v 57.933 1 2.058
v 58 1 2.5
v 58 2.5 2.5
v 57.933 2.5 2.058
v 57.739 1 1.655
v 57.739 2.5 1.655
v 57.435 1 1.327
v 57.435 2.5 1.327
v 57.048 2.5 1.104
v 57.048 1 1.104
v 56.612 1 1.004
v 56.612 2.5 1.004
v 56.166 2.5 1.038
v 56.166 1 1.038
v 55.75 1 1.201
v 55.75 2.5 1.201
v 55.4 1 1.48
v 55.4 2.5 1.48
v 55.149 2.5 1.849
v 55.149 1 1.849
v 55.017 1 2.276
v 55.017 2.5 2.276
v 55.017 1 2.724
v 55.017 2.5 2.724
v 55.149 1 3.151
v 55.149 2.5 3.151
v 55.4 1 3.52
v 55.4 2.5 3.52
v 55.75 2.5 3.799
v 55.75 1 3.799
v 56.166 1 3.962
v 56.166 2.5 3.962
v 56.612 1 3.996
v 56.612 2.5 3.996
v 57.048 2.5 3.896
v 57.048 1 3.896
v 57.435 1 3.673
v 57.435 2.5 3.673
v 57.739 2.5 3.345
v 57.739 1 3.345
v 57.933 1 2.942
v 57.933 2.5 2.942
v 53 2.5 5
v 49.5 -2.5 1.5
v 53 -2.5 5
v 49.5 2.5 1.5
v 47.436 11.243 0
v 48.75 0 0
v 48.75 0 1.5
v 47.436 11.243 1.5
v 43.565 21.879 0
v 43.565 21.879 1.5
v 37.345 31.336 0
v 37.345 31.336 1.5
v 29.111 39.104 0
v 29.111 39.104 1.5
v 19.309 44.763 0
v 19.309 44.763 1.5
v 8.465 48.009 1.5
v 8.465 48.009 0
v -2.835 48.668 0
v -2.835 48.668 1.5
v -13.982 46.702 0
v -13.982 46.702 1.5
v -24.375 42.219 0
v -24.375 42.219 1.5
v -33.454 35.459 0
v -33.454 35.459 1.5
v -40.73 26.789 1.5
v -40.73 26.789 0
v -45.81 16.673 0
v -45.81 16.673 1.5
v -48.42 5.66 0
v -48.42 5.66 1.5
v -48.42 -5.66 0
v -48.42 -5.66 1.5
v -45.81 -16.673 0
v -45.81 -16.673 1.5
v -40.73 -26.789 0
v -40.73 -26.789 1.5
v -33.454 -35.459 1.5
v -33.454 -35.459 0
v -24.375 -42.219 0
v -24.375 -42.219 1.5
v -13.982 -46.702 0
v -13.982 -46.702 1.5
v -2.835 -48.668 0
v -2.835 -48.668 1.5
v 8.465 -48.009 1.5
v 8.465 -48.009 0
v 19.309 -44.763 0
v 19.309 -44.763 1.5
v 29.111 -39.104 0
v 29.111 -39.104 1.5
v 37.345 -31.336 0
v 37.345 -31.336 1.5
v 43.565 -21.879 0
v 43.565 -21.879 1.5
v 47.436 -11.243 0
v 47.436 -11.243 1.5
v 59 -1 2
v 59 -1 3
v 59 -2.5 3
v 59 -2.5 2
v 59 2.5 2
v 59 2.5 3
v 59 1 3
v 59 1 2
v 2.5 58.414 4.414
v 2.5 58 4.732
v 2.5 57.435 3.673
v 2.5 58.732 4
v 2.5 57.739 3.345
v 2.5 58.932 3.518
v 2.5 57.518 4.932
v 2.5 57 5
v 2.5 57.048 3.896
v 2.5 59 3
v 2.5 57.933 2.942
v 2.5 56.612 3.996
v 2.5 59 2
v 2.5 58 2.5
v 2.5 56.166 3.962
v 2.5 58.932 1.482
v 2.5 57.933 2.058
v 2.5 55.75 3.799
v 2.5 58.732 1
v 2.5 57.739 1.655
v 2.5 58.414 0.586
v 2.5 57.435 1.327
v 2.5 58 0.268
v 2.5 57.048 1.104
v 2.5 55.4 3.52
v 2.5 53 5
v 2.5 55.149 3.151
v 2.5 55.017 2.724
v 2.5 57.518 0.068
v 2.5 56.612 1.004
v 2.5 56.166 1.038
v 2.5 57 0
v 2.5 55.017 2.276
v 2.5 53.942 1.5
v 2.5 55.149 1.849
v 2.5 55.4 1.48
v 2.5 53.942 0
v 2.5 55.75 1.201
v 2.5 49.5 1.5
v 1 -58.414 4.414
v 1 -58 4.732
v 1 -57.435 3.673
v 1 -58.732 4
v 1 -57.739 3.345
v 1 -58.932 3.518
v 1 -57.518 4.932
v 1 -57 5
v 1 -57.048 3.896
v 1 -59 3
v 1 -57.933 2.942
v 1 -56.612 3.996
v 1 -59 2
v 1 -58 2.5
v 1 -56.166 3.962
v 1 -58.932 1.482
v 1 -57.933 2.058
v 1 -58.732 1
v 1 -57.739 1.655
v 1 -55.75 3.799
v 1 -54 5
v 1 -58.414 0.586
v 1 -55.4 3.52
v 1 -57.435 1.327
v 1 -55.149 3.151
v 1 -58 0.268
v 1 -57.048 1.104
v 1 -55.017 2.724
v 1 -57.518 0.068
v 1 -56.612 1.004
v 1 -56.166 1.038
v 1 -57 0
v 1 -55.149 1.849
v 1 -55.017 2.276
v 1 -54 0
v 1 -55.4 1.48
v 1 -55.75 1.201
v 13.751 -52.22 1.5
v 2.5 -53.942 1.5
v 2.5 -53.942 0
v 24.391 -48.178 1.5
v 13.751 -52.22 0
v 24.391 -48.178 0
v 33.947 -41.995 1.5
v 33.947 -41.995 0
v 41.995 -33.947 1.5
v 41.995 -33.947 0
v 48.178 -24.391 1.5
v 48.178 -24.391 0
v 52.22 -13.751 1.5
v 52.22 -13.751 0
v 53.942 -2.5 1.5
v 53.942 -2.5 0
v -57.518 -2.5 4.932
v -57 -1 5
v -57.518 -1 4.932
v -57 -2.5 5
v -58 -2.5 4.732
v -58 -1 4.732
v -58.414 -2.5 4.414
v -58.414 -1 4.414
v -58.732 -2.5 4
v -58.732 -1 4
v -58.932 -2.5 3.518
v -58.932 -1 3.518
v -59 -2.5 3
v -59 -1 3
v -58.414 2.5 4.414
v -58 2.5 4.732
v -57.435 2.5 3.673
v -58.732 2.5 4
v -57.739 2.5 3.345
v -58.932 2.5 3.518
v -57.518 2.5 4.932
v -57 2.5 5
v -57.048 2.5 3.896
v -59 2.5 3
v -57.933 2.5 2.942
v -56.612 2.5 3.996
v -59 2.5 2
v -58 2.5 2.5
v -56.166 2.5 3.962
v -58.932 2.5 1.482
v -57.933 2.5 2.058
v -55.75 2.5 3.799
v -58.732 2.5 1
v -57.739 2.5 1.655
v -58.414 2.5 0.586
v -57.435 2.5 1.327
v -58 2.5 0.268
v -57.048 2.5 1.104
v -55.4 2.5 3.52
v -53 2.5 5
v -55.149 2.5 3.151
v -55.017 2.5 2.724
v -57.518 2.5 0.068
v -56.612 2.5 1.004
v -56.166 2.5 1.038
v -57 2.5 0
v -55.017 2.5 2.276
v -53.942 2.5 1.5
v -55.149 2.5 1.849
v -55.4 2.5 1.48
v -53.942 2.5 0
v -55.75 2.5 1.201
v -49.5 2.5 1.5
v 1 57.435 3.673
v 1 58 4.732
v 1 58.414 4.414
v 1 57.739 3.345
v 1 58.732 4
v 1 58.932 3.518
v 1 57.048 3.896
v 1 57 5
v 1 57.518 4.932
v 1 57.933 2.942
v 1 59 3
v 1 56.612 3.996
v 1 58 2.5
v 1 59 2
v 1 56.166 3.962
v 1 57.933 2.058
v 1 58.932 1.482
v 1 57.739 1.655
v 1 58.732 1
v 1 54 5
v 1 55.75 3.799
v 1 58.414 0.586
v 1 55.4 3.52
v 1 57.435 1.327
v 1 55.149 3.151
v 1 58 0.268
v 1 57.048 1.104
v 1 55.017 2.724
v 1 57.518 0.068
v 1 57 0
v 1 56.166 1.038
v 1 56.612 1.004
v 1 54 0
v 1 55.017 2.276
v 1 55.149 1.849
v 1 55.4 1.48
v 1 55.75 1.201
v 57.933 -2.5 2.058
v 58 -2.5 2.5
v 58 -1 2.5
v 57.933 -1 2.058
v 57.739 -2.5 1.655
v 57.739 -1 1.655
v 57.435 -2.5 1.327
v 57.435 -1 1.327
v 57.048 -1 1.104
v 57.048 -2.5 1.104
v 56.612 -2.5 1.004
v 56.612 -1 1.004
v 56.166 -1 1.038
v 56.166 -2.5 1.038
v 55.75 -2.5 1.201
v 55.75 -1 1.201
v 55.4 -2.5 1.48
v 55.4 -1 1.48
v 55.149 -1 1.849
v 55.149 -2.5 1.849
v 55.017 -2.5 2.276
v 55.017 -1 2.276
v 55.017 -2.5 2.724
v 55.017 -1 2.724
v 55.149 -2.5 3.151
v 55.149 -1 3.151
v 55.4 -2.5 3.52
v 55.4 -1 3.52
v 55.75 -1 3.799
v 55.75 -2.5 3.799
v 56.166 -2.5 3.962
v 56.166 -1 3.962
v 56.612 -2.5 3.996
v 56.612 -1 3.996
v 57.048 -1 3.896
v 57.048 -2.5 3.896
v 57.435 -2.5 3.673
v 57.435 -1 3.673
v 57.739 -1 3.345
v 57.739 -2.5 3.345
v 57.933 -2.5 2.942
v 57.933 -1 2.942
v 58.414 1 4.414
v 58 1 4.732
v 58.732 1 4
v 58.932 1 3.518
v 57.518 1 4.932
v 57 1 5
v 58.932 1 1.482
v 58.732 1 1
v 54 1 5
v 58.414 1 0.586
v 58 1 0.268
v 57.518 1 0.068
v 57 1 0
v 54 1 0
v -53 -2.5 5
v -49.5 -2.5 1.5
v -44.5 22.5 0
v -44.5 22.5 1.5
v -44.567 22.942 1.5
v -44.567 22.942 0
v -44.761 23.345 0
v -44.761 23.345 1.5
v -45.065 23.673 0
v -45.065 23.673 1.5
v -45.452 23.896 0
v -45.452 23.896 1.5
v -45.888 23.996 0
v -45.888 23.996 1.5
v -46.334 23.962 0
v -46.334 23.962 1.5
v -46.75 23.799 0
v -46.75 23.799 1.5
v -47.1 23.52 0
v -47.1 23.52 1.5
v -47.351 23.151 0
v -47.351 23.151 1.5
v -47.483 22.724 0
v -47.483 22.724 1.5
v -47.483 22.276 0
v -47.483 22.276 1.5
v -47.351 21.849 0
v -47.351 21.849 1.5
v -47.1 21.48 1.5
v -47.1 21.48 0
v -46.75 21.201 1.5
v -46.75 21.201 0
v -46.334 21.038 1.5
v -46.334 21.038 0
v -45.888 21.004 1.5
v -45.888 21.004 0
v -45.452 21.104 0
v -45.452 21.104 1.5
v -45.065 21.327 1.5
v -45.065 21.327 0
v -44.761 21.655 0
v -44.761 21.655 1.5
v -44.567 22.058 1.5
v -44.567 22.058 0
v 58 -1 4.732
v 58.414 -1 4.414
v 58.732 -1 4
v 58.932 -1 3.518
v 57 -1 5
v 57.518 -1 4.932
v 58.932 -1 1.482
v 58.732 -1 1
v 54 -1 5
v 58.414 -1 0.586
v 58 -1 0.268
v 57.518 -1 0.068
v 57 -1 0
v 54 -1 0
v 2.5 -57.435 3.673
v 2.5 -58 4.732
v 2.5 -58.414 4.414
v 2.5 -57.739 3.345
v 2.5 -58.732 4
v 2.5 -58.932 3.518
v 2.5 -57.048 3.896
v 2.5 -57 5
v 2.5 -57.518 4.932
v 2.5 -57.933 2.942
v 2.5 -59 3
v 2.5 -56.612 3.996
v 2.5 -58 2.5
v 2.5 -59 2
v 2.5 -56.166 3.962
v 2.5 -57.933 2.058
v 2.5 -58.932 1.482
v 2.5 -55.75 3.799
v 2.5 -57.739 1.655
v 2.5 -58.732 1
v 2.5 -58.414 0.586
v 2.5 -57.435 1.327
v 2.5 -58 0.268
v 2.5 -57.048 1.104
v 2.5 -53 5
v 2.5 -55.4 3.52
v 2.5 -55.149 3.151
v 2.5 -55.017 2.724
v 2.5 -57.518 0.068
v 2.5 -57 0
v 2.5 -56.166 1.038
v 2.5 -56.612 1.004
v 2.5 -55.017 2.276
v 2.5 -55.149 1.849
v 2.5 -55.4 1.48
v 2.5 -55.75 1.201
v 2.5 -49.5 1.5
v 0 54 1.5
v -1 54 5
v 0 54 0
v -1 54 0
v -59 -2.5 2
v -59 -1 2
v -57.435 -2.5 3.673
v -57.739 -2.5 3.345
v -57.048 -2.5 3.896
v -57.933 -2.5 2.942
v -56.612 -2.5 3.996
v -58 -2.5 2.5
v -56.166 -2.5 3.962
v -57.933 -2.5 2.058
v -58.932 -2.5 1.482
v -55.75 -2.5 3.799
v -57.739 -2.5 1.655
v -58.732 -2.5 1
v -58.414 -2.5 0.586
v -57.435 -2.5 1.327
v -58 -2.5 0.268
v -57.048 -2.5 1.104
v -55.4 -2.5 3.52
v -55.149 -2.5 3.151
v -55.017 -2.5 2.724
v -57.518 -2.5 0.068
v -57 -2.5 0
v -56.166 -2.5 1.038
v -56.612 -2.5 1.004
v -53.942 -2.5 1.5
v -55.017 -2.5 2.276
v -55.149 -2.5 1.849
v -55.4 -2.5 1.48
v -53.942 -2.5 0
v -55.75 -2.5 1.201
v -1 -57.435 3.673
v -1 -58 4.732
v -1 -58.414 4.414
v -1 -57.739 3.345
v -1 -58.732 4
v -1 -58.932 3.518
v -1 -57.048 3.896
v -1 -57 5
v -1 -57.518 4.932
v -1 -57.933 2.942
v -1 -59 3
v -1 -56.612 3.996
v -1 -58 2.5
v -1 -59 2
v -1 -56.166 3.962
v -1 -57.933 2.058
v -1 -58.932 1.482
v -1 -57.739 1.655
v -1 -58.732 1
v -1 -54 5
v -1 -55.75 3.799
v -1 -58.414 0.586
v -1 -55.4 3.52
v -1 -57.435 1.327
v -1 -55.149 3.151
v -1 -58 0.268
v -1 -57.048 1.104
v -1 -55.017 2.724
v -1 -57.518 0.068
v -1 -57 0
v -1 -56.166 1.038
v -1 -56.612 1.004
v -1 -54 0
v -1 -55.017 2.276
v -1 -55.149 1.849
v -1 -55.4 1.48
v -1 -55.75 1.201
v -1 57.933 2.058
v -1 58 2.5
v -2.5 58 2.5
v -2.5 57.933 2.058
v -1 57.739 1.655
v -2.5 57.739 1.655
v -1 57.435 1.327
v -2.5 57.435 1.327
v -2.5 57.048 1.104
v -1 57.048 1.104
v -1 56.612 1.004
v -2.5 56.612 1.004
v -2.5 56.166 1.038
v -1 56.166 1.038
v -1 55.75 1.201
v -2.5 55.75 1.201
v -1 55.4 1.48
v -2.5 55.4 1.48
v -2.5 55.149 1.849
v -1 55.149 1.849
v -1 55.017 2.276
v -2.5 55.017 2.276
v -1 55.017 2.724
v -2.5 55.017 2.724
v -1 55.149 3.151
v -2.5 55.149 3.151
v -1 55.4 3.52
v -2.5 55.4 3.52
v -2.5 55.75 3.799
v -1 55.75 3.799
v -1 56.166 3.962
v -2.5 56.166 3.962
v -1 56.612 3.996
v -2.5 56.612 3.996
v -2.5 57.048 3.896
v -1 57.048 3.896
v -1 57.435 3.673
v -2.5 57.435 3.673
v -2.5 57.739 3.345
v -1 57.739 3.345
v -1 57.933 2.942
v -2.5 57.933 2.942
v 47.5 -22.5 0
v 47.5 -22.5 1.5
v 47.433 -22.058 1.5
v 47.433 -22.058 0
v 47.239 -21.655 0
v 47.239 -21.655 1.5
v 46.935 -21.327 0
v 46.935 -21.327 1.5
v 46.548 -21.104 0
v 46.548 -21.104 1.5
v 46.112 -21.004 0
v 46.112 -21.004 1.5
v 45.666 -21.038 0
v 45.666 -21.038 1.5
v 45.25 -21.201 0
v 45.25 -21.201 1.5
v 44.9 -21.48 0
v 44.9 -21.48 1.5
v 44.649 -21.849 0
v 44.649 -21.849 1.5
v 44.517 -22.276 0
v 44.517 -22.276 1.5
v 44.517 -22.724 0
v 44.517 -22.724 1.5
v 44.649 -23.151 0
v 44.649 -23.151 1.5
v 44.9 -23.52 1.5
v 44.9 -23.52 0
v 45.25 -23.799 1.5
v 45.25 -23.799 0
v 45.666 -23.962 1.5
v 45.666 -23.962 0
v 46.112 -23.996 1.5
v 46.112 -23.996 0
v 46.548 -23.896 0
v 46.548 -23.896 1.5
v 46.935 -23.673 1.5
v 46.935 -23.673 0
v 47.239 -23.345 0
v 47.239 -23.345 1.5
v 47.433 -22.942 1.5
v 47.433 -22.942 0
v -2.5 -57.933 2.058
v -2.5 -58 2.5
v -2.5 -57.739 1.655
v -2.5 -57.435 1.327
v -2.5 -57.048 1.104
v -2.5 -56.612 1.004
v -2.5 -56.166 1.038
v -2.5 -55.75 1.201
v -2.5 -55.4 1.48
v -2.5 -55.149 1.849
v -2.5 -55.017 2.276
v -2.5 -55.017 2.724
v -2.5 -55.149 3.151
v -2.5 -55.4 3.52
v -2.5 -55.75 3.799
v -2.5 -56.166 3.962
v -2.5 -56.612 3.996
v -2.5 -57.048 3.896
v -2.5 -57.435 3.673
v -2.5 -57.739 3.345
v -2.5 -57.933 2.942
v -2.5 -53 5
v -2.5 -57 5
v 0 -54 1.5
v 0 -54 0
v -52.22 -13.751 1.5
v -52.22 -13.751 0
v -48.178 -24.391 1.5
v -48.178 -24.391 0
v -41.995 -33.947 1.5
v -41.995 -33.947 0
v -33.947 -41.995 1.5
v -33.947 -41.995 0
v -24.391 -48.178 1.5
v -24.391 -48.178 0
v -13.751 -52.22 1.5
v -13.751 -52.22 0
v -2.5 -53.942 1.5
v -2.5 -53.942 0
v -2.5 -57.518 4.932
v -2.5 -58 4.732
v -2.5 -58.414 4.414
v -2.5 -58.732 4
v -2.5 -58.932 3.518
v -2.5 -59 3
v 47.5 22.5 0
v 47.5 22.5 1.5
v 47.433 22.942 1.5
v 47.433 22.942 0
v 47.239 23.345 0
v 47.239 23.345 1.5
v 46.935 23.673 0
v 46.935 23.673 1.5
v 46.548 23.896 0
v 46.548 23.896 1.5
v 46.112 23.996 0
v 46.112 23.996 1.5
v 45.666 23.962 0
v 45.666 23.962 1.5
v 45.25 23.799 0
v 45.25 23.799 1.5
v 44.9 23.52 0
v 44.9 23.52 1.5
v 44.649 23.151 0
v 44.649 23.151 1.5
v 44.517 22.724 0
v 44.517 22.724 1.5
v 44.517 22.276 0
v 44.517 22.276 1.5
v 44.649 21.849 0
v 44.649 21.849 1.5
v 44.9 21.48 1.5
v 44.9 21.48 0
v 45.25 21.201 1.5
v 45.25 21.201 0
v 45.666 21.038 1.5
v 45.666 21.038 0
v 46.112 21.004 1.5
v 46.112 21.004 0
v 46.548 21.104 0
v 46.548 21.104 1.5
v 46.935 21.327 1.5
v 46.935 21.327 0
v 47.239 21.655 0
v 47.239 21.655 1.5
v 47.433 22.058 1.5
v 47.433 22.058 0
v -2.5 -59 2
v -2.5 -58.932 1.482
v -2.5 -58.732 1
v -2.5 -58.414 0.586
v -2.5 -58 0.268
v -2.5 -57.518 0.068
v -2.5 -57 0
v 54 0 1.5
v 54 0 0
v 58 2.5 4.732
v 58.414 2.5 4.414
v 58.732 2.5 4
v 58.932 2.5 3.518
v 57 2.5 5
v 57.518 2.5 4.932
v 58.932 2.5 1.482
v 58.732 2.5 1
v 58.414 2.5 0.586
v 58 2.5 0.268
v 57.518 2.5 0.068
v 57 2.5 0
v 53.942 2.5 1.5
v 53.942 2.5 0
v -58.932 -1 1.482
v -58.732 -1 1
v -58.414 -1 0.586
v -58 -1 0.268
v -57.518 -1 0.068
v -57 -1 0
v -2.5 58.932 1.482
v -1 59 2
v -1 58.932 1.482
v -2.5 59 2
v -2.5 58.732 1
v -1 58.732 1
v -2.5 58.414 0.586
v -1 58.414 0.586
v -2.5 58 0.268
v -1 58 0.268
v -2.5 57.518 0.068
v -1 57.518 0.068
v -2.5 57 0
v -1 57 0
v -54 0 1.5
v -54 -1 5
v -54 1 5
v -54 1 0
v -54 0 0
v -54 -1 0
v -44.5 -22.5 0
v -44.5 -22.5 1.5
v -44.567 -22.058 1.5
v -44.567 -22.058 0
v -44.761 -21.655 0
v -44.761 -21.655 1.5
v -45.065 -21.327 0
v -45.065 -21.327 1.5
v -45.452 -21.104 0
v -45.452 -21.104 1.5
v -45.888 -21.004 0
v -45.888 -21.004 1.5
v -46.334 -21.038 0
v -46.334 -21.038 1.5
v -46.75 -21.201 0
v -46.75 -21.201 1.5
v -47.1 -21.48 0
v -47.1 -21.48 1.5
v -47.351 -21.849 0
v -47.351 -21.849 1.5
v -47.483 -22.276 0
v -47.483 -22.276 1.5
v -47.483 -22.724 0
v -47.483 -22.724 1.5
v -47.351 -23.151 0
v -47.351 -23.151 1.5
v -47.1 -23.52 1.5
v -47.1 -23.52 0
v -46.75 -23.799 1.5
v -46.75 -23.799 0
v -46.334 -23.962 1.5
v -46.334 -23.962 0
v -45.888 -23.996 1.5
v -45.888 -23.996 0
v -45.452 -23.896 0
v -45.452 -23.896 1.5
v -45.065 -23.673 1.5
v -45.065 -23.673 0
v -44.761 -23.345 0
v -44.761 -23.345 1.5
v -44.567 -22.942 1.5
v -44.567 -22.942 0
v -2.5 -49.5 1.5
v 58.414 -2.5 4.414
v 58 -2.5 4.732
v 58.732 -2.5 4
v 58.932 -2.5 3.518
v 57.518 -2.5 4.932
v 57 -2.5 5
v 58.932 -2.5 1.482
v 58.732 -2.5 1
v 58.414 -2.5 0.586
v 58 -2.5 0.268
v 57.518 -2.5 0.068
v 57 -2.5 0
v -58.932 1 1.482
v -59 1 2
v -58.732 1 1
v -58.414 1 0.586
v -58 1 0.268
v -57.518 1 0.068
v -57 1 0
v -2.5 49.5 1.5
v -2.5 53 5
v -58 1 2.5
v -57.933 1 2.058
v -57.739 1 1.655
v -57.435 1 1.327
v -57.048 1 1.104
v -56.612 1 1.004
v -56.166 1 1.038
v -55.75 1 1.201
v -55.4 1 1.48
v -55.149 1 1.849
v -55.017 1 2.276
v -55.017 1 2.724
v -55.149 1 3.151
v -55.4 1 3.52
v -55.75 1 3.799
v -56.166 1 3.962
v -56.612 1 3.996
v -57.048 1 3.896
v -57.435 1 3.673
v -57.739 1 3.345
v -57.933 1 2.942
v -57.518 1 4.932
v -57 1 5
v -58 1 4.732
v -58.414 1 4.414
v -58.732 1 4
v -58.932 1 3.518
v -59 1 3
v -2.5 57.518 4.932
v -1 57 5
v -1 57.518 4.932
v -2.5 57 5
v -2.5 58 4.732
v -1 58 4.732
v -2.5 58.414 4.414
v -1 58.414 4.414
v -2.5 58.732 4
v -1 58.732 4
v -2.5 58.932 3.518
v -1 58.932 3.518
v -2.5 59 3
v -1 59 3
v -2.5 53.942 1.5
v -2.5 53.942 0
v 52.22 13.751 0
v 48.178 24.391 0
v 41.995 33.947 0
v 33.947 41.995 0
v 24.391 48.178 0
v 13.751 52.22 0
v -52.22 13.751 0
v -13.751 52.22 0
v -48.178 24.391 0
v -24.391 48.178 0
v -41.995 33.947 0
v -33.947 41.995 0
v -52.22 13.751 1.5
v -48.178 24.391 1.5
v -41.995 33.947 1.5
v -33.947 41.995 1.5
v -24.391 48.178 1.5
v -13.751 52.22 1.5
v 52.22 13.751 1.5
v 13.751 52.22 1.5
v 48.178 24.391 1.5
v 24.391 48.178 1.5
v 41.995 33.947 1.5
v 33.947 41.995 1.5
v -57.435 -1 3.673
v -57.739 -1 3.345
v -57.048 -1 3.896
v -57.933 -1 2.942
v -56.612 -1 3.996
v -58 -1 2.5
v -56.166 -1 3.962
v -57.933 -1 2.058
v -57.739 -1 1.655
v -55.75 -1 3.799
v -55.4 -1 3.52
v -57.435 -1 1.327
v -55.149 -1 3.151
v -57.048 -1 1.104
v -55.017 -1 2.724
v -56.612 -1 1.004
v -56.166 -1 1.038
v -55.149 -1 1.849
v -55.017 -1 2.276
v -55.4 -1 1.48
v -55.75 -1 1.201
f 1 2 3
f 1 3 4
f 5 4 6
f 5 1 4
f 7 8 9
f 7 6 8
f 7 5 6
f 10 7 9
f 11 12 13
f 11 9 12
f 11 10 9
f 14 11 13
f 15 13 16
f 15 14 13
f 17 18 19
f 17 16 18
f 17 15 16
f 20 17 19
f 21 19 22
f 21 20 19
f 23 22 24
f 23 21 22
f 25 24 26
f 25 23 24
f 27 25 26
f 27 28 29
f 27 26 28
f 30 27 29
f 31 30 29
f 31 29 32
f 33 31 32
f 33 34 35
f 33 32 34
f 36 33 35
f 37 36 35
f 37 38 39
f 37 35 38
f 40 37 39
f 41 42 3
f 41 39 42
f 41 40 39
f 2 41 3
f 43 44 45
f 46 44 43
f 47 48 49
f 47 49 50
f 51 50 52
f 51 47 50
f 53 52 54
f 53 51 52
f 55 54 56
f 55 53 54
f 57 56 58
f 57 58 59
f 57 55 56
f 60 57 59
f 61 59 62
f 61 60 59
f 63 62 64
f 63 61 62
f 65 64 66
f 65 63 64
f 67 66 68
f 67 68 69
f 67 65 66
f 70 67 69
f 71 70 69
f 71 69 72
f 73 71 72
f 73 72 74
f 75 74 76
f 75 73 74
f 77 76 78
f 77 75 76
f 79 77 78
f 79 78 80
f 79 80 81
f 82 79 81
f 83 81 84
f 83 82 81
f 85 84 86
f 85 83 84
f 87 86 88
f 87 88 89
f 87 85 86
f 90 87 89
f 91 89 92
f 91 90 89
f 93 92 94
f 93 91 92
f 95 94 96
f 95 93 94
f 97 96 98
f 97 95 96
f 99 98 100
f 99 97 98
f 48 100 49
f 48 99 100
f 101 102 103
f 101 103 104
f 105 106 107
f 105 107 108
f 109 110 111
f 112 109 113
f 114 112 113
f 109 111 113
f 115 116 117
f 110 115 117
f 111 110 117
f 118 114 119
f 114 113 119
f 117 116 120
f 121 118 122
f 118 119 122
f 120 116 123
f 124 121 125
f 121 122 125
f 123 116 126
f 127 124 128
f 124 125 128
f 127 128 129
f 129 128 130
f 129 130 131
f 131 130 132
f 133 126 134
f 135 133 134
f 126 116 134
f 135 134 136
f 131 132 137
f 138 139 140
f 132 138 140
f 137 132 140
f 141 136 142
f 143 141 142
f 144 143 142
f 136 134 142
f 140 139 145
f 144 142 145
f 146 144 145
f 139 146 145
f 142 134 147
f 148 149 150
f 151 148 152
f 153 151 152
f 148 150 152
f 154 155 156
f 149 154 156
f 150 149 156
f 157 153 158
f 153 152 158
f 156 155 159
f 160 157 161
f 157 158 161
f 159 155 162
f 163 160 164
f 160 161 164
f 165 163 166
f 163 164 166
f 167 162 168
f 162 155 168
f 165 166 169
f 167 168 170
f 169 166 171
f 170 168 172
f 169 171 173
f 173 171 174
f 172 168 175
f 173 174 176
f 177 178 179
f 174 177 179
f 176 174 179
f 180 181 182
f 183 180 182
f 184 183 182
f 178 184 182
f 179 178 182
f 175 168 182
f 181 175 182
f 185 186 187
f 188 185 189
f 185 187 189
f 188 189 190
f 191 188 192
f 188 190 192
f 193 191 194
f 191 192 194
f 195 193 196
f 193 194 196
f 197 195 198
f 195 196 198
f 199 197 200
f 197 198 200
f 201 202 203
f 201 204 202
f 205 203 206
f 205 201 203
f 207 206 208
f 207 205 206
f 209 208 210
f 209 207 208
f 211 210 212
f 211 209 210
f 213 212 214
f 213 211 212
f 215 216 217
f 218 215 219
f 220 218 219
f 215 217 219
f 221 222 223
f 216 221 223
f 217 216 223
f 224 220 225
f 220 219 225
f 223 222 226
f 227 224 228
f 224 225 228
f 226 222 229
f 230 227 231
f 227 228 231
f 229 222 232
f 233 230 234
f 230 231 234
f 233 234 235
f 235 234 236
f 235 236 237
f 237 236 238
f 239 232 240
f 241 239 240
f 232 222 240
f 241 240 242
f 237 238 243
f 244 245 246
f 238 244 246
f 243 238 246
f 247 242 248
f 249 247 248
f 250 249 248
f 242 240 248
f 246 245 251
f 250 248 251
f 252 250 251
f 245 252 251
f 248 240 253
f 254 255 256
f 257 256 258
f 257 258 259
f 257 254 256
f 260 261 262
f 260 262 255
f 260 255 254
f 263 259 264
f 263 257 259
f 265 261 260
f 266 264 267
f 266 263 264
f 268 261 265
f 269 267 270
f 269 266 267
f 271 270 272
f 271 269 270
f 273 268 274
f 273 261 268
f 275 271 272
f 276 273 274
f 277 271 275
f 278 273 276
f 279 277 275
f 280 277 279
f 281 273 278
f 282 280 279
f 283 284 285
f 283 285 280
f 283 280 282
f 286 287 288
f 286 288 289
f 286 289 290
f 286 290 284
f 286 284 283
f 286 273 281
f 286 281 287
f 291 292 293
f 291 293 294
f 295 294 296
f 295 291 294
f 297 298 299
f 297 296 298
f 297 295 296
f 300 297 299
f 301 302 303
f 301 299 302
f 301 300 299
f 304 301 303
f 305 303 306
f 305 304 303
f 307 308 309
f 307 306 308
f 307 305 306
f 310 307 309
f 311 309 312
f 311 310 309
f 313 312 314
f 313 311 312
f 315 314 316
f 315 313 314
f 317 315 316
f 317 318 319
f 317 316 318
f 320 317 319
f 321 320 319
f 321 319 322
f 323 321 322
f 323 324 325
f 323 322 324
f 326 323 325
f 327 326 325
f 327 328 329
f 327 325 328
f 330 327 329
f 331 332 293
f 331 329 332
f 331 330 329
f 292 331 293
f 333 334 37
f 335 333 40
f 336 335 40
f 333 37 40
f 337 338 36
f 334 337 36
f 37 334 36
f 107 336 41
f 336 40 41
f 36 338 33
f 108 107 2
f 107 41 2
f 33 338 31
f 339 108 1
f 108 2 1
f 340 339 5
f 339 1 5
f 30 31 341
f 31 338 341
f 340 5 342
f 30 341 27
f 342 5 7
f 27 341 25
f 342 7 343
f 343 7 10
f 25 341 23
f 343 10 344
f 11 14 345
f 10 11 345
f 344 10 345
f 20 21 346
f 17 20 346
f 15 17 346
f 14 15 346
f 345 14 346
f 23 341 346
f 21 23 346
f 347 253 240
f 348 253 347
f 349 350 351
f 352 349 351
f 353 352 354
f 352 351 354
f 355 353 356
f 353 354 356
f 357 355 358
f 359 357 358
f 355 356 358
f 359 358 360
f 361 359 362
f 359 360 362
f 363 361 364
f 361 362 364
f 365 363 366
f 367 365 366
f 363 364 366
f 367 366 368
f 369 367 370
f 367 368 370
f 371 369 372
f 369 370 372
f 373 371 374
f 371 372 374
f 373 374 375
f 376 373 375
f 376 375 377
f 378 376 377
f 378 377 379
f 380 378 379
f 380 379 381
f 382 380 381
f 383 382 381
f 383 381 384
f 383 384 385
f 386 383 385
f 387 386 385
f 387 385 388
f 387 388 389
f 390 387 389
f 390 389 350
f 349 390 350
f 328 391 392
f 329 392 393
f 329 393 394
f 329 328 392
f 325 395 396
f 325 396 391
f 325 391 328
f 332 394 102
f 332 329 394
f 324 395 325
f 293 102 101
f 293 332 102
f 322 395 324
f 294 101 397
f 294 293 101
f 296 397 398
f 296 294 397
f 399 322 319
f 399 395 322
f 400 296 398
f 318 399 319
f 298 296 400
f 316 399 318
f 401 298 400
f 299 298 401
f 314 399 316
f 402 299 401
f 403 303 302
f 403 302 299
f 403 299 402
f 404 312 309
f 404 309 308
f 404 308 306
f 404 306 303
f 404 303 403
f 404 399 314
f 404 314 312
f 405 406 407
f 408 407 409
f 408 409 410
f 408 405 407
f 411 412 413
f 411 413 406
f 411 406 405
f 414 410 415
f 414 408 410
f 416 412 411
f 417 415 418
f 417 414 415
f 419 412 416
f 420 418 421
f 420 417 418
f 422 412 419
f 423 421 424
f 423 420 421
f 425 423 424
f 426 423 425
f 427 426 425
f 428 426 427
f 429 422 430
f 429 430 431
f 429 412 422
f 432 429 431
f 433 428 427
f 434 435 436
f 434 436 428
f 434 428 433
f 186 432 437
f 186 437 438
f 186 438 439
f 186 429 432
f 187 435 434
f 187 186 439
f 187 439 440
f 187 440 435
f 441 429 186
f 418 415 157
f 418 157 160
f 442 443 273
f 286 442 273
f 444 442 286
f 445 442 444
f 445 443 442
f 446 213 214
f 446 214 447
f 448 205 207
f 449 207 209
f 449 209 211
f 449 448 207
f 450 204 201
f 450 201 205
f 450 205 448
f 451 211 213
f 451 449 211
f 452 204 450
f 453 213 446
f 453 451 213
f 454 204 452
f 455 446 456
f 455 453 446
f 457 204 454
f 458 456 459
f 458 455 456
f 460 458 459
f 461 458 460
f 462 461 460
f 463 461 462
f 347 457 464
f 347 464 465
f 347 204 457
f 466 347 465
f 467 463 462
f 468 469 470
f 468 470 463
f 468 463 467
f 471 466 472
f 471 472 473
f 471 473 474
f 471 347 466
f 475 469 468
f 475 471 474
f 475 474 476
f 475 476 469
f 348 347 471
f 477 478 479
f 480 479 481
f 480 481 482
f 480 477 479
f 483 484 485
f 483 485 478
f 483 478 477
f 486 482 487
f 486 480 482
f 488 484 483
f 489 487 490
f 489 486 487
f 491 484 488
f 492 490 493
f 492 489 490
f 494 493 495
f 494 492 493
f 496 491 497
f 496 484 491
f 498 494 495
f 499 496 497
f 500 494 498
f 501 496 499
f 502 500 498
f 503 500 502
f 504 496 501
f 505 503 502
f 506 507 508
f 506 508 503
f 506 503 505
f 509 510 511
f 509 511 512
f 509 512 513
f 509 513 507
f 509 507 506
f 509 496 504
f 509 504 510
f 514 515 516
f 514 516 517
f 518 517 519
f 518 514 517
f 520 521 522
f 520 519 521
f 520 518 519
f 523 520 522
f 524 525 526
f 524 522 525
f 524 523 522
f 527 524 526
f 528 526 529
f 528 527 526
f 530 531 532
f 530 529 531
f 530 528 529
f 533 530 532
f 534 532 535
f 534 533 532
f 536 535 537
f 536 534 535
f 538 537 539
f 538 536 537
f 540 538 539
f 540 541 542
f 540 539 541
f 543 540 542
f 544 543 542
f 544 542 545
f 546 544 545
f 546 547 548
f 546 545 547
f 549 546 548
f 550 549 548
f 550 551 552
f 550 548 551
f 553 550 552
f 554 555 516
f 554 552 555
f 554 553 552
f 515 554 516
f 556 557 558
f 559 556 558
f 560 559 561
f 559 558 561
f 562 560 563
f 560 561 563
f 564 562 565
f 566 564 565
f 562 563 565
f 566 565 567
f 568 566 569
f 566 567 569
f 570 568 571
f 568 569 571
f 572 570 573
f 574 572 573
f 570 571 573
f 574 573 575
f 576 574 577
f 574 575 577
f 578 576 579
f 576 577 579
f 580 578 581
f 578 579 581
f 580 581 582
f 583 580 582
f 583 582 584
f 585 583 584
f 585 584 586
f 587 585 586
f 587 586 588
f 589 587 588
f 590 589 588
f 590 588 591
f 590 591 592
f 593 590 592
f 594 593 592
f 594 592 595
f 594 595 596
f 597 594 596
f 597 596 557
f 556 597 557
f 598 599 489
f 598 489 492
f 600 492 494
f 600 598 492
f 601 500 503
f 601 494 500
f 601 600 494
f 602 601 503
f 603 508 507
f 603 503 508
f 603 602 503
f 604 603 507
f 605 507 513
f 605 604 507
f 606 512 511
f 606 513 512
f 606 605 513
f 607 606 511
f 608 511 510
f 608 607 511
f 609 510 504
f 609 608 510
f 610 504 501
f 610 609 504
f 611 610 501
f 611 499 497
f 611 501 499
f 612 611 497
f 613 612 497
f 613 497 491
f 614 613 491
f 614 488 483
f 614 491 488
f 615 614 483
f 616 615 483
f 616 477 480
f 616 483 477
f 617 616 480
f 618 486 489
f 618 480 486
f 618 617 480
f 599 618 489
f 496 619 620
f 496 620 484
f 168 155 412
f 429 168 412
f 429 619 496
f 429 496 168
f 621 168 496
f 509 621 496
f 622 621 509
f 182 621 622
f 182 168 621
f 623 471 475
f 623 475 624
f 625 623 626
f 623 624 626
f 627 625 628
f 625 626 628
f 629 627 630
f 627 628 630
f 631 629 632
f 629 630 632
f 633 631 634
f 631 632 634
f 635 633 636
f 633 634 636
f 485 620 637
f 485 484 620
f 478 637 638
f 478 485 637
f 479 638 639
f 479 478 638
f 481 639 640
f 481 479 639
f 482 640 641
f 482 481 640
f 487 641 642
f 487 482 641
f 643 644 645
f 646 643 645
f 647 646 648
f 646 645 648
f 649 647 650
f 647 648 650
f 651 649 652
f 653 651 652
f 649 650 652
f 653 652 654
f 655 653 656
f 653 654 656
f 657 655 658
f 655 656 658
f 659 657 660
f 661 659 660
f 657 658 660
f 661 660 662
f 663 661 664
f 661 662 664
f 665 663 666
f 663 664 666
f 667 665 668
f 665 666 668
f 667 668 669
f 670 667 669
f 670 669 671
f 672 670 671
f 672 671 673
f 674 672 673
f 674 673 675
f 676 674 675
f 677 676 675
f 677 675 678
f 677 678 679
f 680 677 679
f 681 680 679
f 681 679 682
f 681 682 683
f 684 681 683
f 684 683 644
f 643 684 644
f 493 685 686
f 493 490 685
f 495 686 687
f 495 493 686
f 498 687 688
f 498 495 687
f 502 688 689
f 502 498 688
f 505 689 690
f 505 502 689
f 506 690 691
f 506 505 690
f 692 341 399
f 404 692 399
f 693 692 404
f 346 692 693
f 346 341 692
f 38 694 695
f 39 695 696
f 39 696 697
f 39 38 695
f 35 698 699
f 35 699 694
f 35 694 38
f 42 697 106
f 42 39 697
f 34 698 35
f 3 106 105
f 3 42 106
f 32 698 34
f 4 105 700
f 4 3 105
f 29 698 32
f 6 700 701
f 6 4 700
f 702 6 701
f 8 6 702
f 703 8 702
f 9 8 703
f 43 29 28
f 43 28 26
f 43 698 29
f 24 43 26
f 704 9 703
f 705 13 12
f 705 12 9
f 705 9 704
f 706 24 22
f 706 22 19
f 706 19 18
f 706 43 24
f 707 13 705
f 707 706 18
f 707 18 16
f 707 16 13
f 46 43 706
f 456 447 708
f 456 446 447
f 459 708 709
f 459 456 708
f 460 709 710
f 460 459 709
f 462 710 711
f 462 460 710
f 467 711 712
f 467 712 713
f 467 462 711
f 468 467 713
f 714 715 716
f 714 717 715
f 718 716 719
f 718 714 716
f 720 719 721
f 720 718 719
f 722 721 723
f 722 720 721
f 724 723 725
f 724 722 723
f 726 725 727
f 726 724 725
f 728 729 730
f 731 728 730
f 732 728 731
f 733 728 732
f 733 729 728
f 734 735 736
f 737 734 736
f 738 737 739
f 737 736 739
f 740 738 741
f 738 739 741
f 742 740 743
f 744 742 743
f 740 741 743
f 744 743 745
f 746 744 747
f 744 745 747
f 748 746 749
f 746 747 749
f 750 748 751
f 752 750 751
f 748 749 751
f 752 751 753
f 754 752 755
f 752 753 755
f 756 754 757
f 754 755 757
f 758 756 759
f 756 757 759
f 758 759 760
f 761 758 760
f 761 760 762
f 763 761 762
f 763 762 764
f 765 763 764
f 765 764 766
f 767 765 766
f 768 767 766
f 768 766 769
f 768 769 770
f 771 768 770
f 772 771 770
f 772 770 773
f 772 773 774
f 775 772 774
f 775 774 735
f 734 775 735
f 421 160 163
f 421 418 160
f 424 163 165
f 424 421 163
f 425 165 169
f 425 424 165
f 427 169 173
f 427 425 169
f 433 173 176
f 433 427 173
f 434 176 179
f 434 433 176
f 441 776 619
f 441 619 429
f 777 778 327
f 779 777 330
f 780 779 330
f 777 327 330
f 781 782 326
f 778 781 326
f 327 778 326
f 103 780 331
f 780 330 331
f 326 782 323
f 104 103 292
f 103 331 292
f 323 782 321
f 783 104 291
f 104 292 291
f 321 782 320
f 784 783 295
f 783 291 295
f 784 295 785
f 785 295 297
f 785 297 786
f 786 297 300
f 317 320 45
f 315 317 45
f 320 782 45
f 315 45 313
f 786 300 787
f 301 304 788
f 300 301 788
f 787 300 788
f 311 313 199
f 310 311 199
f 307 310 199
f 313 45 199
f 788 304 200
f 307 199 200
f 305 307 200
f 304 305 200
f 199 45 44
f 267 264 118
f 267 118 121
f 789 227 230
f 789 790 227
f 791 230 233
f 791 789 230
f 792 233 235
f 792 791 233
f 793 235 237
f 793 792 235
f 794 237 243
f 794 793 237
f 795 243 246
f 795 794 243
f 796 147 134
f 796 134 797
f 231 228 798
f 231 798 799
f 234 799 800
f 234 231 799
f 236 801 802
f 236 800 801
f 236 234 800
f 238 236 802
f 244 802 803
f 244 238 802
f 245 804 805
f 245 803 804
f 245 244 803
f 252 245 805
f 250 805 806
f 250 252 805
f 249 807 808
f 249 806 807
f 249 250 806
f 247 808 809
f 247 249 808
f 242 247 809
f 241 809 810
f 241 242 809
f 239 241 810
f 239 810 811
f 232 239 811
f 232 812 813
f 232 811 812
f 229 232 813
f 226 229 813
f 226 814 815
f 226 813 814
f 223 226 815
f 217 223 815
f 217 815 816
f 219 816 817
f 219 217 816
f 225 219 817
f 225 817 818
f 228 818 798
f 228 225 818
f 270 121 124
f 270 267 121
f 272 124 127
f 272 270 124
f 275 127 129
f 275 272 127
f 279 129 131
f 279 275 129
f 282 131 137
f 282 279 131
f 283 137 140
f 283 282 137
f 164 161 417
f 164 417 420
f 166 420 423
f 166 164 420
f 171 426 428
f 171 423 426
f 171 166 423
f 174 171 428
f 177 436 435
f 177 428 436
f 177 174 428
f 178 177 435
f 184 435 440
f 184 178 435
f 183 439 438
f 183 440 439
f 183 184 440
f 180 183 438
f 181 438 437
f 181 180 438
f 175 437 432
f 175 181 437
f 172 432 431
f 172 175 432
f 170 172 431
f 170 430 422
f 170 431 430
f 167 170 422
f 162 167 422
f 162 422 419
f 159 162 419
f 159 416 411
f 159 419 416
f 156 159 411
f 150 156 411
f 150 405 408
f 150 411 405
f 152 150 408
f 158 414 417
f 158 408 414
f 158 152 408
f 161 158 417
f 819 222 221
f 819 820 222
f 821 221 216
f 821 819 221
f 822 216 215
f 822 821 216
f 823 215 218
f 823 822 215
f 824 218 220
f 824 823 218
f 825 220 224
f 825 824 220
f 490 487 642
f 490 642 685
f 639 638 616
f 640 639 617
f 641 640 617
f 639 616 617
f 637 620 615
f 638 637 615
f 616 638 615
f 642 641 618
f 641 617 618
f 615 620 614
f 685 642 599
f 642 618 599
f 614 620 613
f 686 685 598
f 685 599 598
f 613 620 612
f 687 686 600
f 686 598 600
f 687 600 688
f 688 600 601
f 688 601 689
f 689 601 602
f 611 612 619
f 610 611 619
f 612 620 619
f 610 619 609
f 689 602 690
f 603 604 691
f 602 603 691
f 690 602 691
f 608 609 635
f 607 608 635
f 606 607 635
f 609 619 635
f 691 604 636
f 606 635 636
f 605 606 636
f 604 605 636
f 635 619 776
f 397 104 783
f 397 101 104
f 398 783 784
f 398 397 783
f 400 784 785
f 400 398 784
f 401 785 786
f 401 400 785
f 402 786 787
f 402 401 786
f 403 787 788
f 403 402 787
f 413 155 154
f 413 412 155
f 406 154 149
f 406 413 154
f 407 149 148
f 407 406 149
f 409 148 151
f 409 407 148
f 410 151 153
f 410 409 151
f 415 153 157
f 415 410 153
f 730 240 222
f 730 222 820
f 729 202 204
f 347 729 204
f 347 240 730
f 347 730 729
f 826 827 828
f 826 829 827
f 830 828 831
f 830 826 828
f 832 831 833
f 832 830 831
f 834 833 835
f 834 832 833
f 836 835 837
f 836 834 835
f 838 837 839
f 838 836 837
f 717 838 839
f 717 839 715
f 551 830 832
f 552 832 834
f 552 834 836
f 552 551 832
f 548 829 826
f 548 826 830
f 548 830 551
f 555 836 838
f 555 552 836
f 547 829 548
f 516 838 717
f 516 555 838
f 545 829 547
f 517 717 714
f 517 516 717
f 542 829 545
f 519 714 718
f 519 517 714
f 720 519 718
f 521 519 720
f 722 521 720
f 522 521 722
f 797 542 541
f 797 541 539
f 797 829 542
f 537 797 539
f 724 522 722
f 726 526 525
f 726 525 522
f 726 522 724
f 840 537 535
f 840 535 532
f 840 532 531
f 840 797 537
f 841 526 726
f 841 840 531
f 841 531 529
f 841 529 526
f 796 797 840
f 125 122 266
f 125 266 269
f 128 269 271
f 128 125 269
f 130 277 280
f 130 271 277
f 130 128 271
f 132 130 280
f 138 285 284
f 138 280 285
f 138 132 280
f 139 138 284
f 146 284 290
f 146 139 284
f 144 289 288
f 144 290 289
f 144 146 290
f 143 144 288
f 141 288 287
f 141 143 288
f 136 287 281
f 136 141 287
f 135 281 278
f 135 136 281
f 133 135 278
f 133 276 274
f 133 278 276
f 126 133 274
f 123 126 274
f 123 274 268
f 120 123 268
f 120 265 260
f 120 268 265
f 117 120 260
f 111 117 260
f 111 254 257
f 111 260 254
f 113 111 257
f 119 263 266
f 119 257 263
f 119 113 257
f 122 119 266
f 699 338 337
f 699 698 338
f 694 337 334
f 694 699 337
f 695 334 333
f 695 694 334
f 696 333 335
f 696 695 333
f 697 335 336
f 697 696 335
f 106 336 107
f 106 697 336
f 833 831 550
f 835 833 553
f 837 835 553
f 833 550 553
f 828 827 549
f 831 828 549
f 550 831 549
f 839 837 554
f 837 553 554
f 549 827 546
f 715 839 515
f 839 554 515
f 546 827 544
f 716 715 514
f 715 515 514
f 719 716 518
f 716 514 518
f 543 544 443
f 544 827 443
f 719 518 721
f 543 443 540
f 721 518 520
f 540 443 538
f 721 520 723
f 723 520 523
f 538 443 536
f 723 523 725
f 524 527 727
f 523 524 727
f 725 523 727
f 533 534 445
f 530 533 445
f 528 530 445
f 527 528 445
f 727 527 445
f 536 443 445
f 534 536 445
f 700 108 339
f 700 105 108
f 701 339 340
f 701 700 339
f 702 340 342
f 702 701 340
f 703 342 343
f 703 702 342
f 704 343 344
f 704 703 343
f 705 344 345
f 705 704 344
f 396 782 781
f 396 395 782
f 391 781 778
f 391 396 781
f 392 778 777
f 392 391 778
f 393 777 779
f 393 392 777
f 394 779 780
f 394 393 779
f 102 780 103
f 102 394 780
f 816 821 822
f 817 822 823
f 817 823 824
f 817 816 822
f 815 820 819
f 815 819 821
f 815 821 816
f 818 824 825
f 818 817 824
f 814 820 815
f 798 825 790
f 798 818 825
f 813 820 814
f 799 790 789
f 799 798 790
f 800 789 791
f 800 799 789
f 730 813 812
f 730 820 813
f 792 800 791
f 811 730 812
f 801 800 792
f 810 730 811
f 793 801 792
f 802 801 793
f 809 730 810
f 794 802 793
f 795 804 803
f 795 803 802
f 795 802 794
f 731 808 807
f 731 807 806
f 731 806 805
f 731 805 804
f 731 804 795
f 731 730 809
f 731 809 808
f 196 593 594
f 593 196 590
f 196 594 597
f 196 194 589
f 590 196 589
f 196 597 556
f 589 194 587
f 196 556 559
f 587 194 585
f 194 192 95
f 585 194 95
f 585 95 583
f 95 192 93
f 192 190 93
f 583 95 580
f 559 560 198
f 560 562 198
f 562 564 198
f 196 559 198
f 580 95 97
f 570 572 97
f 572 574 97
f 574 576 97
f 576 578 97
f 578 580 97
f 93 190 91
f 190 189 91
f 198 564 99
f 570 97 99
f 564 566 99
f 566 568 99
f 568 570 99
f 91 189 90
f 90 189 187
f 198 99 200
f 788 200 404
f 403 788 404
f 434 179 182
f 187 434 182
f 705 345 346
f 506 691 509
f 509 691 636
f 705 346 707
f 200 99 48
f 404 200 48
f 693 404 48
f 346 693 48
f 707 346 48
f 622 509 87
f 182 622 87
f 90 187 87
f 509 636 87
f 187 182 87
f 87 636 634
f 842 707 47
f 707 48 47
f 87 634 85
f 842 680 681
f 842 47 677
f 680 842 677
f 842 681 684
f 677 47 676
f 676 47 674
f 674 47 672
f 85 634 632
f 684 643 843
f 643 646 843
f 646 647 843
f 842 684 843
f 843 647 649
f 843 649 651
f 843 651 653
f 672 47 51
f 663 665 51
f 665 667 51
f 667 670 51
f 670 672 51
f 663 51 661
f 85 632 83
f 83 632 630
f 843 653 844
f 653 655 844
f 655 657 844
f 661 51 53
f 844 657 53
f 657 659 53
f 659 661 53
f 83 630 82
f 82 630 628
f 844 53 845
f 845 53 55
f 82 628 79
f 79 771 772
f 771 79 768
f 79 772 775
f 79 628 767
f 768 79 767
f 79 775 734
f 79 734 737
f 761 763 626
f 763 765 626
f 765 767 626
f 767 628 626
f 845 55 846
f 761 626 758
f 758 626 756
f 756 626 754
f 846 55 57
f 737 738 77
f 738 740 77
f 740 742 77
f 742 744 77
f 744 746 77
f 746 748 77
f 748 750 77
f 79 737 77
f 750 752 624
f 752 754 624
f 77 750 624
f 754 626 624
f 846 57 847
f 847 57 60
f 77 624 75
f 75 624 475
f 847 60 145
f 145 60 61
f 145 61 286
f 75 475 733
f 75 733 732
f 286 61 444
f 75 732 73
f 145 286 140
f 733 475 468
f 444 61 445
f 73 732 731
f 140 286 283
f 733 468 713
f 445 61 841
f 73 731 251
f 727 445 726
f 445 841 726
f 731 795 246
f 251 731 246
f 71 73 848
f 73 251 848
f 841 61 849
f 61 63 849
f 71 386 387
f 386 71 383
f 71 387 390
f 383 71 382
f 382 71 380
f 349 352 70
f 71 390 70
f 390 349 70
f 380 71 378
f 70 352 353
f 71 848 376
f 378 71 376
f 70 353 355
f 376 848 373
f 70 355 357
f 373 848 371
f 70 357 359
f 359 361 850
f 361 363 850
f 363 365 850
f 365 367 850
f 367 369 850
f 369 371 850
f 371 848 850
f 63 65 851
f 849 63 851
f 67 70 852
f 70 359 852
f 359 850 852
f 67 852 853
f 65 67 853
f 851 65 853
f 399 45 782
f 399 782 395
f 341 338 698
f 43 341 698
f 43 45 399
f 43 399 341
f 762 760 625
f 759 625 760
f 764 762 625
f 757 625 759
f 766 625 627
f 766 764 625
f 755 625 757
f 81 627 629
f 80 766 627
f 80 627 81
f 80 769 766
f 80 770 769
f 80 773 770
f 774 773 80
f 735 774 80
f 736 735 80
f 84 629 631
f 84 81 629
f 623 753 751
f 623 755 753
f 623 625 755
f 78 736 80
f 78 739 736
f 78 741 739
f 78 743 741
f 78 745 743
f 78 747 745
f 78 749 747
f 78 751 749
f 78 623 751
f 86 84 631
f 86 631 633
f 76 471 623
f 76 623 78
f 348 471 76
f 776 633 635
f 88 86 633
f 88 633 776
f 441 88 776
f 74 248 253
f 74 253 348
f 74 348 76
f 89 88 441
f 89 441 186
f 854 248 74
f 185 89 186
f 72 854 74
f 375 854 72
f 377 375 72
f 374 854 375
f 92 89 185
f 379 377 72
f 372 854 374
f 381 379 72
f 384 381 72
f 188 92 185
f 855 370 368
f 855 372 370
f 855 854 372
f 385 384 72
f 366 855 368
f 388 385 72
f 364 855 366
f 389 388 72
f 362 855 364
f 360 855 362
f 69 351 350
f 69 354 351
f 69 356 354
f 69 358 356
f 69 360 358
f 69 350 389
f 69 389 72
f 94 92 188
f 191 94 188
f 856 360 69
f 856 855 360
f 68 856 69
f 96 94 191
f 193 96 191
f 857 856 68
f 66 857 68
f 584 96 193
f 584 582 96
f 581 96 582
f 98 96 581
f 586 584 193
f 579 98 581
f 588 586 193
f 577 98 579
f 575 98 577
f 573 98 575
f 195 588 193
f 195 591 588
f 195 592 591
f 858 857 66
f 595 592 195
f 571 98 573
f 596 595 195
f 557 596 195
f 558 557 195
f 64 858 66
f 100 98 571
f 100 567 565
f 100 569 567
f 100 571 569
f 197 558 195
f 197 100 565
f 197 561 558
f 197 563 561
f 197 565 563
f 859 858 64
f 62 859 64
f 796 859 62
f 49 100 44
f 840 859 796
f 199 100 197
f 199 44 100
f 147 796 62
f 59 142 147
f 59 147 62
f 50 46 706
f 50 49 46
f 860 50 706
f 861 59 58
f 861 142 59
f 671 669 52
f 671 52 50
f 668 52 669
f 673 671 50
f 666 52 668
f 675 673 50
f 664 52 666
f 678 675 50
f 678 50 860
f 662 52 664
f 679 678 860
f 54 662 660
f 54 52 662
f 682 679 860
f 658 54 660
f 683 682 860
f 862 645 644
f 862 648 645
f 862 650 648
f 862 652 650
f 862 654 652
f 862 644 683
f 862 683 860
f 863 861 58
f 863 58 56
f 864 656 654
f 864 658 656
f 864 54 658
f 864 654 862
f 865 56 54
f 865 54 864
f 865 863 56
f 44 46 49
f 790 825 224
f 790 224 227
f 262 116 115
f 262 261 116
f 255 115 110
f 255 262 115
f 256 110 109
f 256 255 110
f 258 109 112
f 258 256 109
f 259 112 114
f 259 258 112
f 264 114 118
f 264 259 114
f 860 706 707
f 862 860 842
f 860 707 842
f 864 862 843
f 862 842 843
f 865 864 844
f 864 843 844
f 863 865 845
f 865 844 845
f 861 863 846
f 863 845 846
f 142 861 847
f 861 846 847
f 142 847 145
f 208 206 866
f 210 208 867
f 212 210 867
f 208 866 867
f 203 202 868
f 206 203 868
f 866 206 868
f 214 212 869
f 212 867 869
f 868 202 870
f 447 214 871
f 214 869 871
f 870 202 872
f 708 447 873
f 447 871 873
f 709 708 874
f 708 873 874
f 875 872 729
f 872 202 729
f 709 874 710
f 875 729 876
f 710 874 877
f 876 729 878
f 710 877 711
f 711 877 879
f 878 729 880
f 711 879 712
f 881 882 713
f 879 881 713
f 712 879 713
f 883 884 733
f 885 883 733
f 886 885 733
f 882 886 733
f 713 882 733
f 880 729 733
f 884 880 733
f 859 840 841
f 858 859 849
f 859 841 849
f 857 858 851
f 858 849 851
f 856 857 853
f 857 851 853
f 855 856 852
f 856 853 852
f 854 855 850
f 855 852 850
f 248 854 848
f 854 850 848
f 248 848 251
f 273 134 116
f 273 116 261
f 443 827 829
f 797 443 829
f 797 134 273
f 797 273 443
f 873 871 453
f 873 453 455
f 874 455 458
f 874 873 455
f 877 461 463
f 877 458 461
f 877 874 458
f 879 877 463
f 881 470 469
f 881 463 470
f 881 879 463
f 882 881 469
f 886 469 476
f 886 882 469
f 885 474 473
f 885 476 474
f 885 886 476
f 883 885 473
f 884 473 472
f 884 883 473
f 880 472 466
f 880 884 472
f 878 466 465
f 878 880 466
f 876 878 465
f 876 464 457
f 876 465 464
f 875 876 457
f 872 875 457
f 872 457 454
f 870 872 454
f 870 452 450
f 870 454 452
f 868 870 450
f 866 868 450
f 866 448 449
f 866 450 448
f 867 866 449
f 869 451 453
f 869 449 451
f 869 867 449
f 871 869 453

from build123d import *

# Parameters (mm, degrees)
CYLINDER001_R              = 1.5
CYLINDER001_DEPTH          = 10
BOX001_W                   = 5
BOX001_H                   = 2
BOX001_DEPTH               = 5
BOX_W                      = 5
BOX_H                      = 5
BOX_DEPTH                  = 10
FILLET_R                   = 2
FILLET_PLACEMENT_ANGLE     = 90
CHAMFER_SIZE               = 4
SKETCH005_R                = 54
SKETCH005_R_2              = 48.75
PAD003_DEPTH               = 1.5
SKETCH006_R                = 1.5
POCKET002_DEPTH            = 1.501
CYLINDER003_R              = 1.5
CYLINDER003_DEPTH          = 10
BOX005_W                   = 5
BOX005_H                   = 2
BOX005_DEPTH               = 5
BOX004_W                   = 5
BOX004_H                   = 5
BOX004_DEPTH               = 10
FILLET002_R                = 2
FILLET002_PLACEMENT_ANGLE  = 90
CHAMFER002_SIZE            = 4
CHAMFER002_PLACEMENT_ANGLE = 90
CYLINDER004_R              = 1.5
CYLINDER004_DEPTH          = 10
BOX007_W                   = 5
BOX007_H                   = 2
BOX007_DEPTH               = 5
BOX006_W                   = 5
BOX006_H                   = 5
BOX006_DEPTH               = 10
FILLET003_R                = 2
FILLET003_PLACEMENT_ANGLE  = 90
CHAMFER003_SIZE            = 4
CHAMFER003_PLACEMENT_ANGLE = 180
CYLINDER005_R              = 1.5
CYLINDER005_DEPTH          = 10
BOX009_W                   = 5
BOX009_H                   = 2
BOX009_DEPTH               = 5
BOX008_W                   = 5
BOX008_H                   = 5
BOX008_DEPTH               = 10
FILLET004_R                = 2
FILLET004_PLACEMENT_ANGLE  = 90
CHAMFER004_SIZE            = 4
CHAMFER004_PLACEMENT_ANGLE = 90


with BuildPart() as screw:
    # Cylinder001 → Cylinder001 (new body)
    with BuildSketch(Plane(origin=(2.5, -2.75, 7.5), x_dir=(0, 0, 1), z_dir=(0, 1, 0))):
        Circle(CYLINDER001_R)
    extrude(amount=CYLINDER001_DEPTH)


with BuildPart() as extleghole:
    # Box001 → Box001 (new body)
    with BuildSketch(Plane(origin=(0, 1.5, 5), x_dir=(1, 0, 0), z_dir=(0, 0, 1))):
        with Locations((2.5, 1)):
            Rectangle(BOX001_W, BOX001_H)
    extrude(amount=BOX001_DEPTH)


with BuildPart() as screwext:
    # Box → Box (new body)
    with BuildSketch(Plane.XY):
        with Locations((2.5, 2.5)):
            Rectangle(BOX_W, BOX_H)
    extrude(amount=BOX_DEPTH)

    # Cut: cut ExtLegHole
    add(extleghole.part, mode=Mode.SUBTRACT)

    # Cut001: cut Screw
    add(screw.part, mode=Mode.SUBTRACT)

    # Fillet
    fillet_edges = [screwext.edges().sort_by_distance(p)[0] for p in [
        (0, 0.75, 10),
        (0, 4.25, 10),
        (5, 0.75, 10),
        (5, 4.25, 10),
    ]]
    fillet(fillet_edges, radius=FILLET_R)


with BuildPart() as screwext_1:
    # Fillet placement: moved
    add(screwext.part.moved(Location((49, -2.5, 5))).rotate(Axis((49, -2.5, 5), (0, 1, 0)), FILLET_PLACEMENT_ANGLE))

    # Chamfer
    chamfer_edges = [screwext_1.edges().sort_by_distance(p)[0] for p in [
        (49, 0, 5),
    ]]
    chamfer(chamfer_edges, length=CHAMFER_SIZE)


with BuildPart() as fusion:
    # Sketch005 → Pad003 (new body)
    with BuildSketch(Plane.XY):
        Circle(SKETCH005_R)
        Circle(SKETCH005_R_2, mode=Mode.SUBTRACT)
    extrude(amount=PAD003_DEPTH)

    # Sketch006 (on Face4 of Pad003) → Pocket002 (cut, through all)
    with BuildSketch(Plane.XY.offset(1.5)):
        with Locations((46, 22.5)):
            Circle(SKETCH006_R)
        with Locations((-46, -22.5)):
            Circle(SKETCH006_R)
        with Locations((-46, 22.5)):
            Circle(SKETCH006_R)
        with Locations((46, -22.5)):
            Circle(SKETCH006_R)
    extrude(amount=-POCKET002_DEPTH, mode=Mode.SUBTRACT)

    # Fusion: union ScrewExt
    add(screwext_1.part)


with BuildPart() as screw002:
    # Cylinder003 → Cylinder003 (new body)
    with BuildSketch(Plane(origin=(2.5, -2.75, 7.5), x_dir=(0, 0, 1), z_dir=(0, 1, 0))):
        Circle(CYLINDER003_R)
    extrude(amount=CYLINDER003_DEPTH)


with BuildPart() as extleghole002:
    # Box005 → Box005 (new body)
    with BuildSketch(Plane(origin=(0, 1.5, 5), x_dir=(1, 0, 0), z_dir=(0, 0, 1))):
        with Locations((2.5, 1)):
            Rectangle(BOX005_W, BOX005_H)
    extrude(amount=BOX005_DEPTH)


with BuildPart() as fusion001:
    # Box004 → Box004 (new body)
    with BuildSketch(Plane.XY):
        with Locations((2.5, 2.5)):
            Rectangle(BOX004_W, BOX004_H)
    extrude(amount=BOX004_DEPTH)

    # Cut004: cut ExtLegHole002
    add(extleghole002.part, mode=Mode.SUBTRACT)

    # Cut005: cut Screw002
    add(screw002.part, mode=Mode.SUBTRACT)

    # Fillet002
    fillet002_edges = [fusion001.edges().sort_by_distance(p)[0] for p in [
        (0, 0.75, 10),
        (0, 4.25, 10),
        (5, 0.75, 10),
        (5, 4.25, 10),
    ]]
    fillet(fillet002_edges, radius=FILLET002_R)


with BuildPart() as fusion001_1:
    # Fillet002 placement: moved
    add(fusion001.part.moved(Location((49, -2.5, 5))).rotate(Axis((49, -2.5, 5), (0, 1, 0)), FILLET002_PLACEMENT_ANGLE))

    # Chamfer002
    chamfer002_edges = [fusion001_1.edges().sort_by_distance(p)[0] for p in [
        (49, 0, 5),
    ]]
    chamfer(chamfer002_edges, length=CHAMFER002_SIZE)


with BuildPart() as fusion001_2:
    # Chamfer002 placement: moved
    add(fusion001_1.part.rotate(Axis((0, 0, 0), (0, 0, 1)), CHAMFER002_PLACEMENT_ANGLE))

    # Fusion001: union Fusion
    add(fusion.part)


with BuildPart() as screw003:
    # Cylinder004 → Cylinder004 (new body)
    with BuildSketch(Plane(origin=(2.5, -2.75, 7.5), x_dir=(0, 0, 1), z_dir=(0, 1, 0))):
        Circle(CYLINDER004_R)
    extrude(amount=CYLINDER004_DEPTH)


with BuildPart() as extleghole003:
    # Box007 → Box007 (new body)
    with BuildSketch(Plane(origin=(0, 1.5, 5), x_dir=(1, 0, 0), z_dir=(0, 0, 1))):
        with Locations((2.5, 1)):
            Rectangle(BOX007_W, BOX007_H)
    extrude(amount=BOX007_DEPTH)


with BuildPart() as fusion002:
    # Box006 → Box006 (new body)
    with BuildSketch(Plane.XY):
        with Locations((2.5, 2.5)):
            Rectangle(BOX006_W, BOX006_H)
    extrude(amount=BOX006_DEPTH)

    # Cut006: cut ExtLegHole003
    add(extleghole003.part, mode=Mode.SUBTRACT)

    # Cut007: cut Screw003
    add(screw003.part, mode=Mode.SUBTRACT)

    # Fillet003
    fillet003_edges = [fusion002.edges().sort_by_distance(p)[0] for p in [
        (0, 0.75, 10),
        (0, 4.25, 10),
        (5, 0.75, 10),
        (5, 4.25, 10),
    ]]
    fillet(fillet003_edges, radius=FILLET003_R)


with BuildPart() as fusion002_1:
    # Fillet003 placement: moved
    add(fusion002.part.moved(Location((49, -2.5, 5))).rotate(Axis((49, -2.5, 5), (0, 1, 0)), FILLET003_PLACEMENT_ANGLE))

    # Chamfer003
    chamfer003_edges = [fusion002_1.edges().sort_by_distance(p)[0] for p in [
        (49, 0, 5),
    ]]
    chamfer(chamfer003_edges, length=CHAMFER003_SIZE)


with BuildPart() as fusion002_2:
    # Chamfer003 placement: moved
    add(fusion002_1.part.rotate(Axis((0, 0, 0), (0, 0, 1)), CHAMFER003_PLACEMENT_ANGLE))

    # Fusion002: union Fusion001
    add(fusion001_2.part)


with BuildPart() as screw004:
    # Cylinder005 → Cylinder005 (new body)
    with BuildSketch(Plane(origin=(2.5, -2.75, 7.5), x_dir=(0, 0, 1), z_dir=(0, 1, 0))):
        Circle(CYLINDER005_R)
    extrude(amount=CYLINDER005_DEPTH)


with BuildPart() as extleghole004:
    # Box009 → Box009 (new body)
    with BuildSketch(Plane(origin=(0, 1.5, 5), x_dir=(1, 0, 0), z_dir=(0, 0, 1))):
        with Locations((2.5, 1)):
            Rectangle(BOX009_W, BOX009_H)
    extrude(amount=BOX009_DEPTH)


with BuildPart() as finalcsholder:
    # Box008 → Box008 (new body)
    with BuildSketch(Plane.XY):
        with Locations((2.5, 2.5)):
            Rectangle(BOX008_W, BOX008_H)
    extrude(amount=BOX008_DEPTH)

    # Cut008: cut ExtLegHole004
    add(extleghole004.part, mode=Mode.SUBTRACT)

    # Cut009: cut Screw004
    add(screw004.part, mode=Mode.SUBTRACT)

    # Fillet004
    fillet004_edges = [finalcsholder.edges().sort_by_distance(p)[0] for p in [
        (0, 0.75, 10),
        (0, 4.25, 10),
        (5, 0.75, 10),
        (5, 4.25, 10),
    ]]
    fillet(fillet004_edges, radius=FILLET004_R)


with BuildPart() as finalcsholder_1:
    # Fillet004 placement: moved
    add(finalcsholder.part.moved(Location((49, -2.5, 5))).rotate(Axis((49, -2.5, 5), (0, 1, 0)), FILLET004_PLACEMENT_ANGLE))

    # Chamfer004
    chamfer004_edges = [finalcsholder_1.edges().sort_by_distance(p)[0] for p in [
        (49, 0, 5),
    ]]
    chamfer(chamfer004_edges, length=CHAMFER004_SIZE)


with BuildPart() as finalcsholder_2:
    # Chamfer004 placement: moved
    add(finalcsholder_1.part.rotate(Axis((0, 0, 0), (0, 0, -1)), CHAMFER004_PLACEMENT_ANGLE))

    # Fusion003: union Fusion002
    add(fusion002_2.part)


solid = finalcsholder_2.part
